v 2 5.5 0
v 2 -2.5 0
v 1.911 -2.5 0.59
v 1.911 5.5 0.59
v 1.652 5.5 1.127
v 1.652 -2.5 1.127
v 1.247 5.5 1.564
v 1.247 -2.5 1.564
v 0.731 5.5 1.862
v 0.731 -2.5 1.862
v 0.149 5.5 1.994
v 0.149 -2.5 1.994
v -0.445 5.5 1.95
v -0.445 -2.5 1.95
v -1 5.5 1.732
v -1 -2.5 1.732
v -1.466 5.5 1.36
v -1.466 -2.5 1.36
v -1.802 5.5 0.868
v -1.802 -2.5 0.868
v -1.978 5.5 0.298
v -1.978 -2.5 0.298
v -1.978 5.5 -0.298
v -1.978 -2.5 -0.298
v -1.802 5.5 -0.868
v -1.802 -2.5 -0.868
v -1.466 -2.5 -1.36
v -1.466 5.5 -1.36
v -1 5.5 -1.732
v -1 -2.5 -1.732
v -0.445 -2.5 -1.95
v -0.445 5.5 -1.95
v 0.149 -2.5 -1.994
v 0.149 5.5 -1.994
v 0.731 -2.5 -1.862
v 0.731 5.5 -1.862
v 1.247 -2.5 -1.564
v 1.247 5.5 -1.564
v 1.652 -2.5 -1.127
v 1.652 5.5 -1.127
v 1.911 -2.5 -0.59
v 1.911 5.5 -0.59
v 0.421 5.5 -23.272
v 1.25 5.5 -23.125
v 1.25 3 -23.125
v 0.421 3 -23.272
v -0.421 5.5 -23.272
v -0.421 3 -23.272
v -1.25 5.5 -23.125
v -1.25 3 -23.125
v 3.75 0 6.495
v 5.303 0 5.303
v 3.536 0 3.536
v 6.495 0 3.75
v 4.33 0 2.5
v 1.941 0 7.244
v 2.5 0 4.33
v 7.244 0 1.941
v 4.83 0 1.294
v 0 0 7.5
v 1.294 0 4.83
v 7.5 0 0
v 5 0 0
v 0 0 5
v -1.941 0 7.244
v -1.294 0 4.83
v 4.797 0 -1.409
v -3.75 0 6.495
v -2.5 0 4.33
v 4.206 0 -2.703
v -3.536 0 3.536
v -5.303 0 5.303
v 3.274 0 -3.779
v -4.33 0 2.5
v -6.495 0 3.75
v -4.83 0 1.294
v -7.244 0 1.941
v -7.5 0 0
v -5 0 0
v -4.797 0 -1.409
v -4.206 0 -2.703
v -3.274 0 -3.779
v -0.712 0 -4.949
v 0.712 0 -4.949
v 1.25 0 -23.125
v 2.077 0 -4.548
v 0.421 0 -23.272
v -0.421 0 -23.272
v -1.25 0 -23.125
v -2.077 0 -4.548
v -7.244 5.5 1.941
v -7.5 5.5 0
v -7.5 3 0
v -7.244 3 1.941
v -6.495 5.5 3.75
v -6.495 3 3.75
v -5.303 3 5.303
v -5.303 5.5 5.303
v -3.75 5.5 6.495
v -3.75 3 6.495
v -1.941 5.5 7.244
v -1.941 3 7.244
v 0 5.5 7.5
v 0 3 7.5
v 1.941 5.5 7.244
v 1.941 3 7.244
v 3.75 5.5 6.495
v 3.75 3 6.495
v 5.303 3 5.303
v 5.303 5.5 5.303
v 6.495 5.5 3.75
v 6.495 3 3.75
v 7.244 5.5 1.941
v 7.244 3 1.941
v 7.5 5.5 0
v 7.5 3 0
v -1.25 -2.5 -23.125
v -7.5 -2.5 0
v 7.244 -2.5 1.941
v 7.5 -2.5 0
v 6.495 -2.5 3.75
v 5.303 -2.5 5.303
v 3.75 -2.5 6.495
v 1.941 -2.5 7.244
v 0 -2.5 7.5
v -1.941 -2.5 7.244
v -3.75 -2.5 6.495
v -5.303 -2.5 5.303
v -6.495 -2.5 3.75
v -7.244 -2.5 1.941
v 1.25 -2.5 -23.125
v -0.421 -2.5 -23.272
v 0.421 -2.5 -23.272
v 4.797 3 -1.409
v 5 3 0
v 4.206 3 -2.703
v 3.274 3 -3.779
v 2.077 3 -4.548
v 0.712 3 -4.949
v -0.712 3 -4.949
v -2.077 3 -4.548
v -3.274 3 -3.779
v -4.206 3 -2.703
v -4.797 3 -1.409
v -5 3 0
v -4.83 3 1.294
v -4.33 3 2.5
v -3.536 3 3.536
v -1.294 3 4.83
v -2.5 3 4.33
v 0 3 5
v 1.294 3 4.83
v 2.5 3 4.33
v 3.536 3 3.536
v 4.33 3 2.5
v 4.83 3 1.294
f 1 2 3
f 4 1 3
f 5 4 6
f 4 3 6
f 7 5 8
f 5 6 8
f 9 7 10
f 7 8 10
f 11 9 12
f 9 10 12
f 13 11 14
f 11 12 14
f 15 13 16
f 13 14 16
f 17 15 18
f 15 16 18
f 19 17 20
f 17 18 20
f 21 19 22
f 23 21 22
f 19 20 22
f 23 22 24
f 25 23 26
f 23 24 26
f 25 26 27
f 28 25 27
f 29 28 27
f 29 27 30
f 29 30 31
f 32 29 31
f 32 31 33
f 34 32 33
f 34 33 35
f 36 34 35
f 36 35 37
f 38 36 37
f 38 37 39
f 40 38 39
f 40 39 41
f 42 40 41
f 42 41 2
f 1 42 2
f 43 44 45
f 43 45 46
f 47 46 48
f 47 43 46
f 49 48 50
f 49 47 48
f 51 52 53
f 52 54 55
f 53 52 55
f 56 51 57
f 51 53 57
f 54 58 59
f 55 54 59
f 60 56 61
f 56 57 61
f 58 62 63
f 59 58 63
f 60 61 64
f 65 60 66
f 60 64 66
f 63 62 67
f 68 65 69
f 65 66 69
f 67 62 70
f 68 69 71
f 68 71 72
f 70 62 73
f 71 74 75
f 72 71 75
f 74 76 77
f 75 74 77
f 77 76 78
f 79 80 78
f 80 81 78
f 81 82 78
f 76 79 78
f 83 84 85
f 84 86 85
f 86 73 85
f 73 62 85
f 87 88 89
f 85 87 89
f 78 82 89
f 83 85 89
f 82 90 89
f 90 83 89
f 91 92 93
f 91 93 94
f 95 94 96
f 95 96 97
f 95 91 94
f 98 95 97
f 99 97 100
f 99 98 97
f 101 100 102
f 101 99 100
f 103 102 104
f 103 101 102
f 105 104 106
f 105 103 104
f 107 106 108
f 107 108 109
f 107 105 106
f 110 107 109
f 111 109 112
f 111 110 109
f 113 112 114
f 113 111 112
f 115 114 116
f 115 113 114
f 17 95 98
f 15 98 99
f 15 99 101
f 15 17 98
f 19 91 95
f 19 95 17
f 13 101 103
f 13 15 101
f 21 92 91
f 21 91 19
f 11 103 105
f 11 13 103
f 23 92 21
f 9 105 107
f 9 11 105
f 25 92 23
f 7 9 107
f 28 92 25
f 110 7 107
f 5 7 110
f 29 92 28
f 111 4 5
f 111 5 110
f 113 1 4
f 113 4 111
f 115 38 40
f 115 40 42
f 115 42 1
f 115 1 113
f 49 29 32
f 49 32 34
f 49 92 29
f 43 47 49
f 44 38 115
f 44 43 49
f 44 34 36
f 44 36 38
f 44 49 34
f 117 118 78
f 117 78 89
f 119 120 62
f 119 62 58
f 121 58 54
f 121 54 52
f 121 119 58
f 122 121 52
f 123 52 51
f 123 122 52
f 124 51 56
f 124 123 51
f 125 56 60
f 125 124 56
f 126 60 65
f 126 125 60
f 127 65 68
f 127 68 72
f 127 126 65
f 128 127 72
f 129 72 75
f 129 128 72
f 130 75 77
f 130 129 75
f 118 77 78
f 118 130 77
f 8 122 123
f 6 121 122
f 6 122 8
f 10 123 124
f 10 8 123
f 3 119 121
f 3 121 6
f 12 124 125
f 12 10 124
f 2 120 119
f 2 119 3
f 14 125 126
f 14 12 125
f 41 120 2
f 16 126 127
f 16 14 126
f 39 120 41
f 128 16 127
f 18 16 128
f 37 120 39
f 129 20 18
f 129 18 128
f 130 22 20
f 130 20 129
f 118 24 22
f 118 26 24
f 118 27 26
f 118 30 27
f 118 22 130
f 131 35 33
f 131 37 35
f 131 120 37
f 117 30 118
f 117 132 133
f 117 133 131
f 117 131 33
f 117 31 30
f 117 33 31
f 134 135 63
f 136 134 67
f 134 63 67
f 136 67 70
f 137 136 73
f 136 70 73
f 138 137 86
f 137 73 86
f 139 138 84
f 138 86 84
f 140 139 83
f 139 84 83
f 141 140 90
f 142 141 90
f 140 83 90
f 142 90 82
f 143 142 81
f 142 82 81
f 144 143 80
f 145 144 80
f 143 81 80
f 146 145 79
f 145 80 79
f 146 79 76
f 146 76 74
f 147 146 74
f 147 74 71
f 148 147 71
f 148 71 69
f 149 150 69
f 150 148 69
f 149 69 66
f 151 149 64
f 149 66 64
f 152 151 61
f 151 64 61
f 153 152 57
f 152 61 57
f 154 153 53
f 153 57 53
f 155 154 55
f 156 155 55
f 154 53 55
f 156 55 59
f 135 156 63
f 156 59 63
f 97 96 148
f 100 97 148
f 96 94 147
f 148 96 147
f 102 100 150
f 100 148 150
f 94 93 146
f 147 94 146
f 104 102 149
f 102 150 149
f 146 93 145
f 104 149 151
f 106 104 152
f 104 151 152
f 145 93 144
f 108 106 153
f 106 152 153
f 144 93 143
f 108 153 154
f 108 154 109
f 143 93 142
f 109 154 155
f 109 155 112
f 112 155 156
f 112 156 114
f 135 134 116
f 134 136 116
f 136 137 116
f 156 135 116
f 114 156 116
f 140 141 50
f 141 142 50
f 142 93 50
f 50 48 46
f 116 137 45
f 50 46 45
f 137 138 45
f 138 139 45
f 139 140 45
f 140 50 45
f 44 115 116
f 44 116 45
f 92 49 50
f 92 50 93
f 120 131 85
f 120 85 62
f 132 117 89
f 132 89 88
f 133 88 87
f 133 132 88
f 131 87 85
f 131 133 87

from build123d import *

# Parameters (mm, degrees)
SKETCH_1_R          = 5
EXTRUDE_1_DEPTH     = 3
EXTRUDE_3_DEPTH     = 2.5
EXTRUDE_4_DEPTH     = 2.5
EXTRUDE_START       = -8
EXTRUDE_5_DEPTH     = 2.5
SKETCH_9_R          = 2
CUT_EXTRUDE_1_DEPTH = 9


with BuildPart() as part:
    # 草图1 → 凸台-拉伸1 (new body)
    with BuildSketch(Plane(origin=(0, 0, 0), x_dir=(1, 0, 0), z_dir=(0, 1, 0))):
        Circle(SKETCH_1_R)
    extrude(amount=EXTRUDE_1_DEPTH)

    # 草图6 → 凸台-拉伸3 (add)
    with BuildSketch(Plane.XZ):
        with BuildLine():
            Line((0, -5), (0, 5))
            ThreePointArc((0, 5), (-3.535533906, 3.535533906), (-5, 0))
            Line((-5, 0), (-4.319264806, -2.518720218))
            ThreePointArc((-4.319264806, -2.518720218), (-2.490622303, -4.335527712), (0, -5))
        make_face()
        with BuildLine():
            Line((0, -18.5), (0, -5))
            ThreePointArc((0, -5), (-2.490622303, -4.335527712), (-4.319264806, -2.518720218))
            Line((-4.319264806, -2.518720218), (0, -18.5))
        make_face()
        with BuildLine():
            ThreePointArc((5, 0), (3.535533906, 3.535533906), (0, 5))
            Line((0, 5), (0, -5))
            ThreePointArc((0, -5), (2.490622303, -4.335527712), (4.319264806, -2.518720218))
            Line((4.319264806, -2.518720218), (5, 0))
        make_face()
        with BuildLine():
            ThreePointArc((4.319264806, -2.518720218), (2.490622303, -4.335527712), (0, -5))
            Line((0, -5), (0, -18.5))
            Line((0, -18.5), (4.319264806, -2.518720218))
        make_face()
    extrude_3 = extrude(amount=EXTRUDE_3_DEPTH)

    # 镜向1: 凸台-拉伸3 across plane
    add(extrude_3.mirror(Plane.ZX.offset(1.5)))

    # 草图8 → 凸台-拉伸4 (add)
    with BuildSketch(Plane(origin=(0, 5.5, 0), x_dir=(1, 0, 0), z_dir=(0, 1, 0))):
        with BuildLine():
            Line((1.25, 23.125), (0, 18.5))
            Line((0, 18.5), (-1.25, 23.125))
            Line((-1.25, 23.125), (-7.5, 0))
            ThreePointArc((-7.5, 0), (0, -7.5), (7.5, 0))
            Line((7.5, 0), (1.25, 23.125))
        make_face()
        with BuildLine():
            Line((-5, 0), (0, 18.5))
            Line((0, 18.5), (5, 0))
            ThreePointArc((5, 0), (0, -5), (-5, 0))
        make_face(mode=Mode.SUBTRACT)
        with BuildLine():
            Line((-1.25, 23.125), (0, 18.5))
            Line((0, 18.5), (1.25, 23.125))
            ThreePointArc((1.25, 23.125), (0, 23.290941974), (-1.25, 23.125))
        make_face()
    extrude(amount=-EXTRUDE_4_DEPTH)

    # 草图8<4> → 凸台-拉伸5 (add)
    with BuildSketch(Plane(origin=(0, 5.5, 0), x_dir=(1, 0, 0), z_dir=(0, 1, 0)).offset(EXTRUDE_START)):
        with BuildLine():
            Line((-7.5, 0), (-1.25, 23.125))
            ThreePointArc((-1.25, 23.125), (0, 23.290941974), (1.25, 23.125))
            Line((1.25, 23.125), (7.5, 0))
            ThreePointArc((7.5, 0), (0, -7.5), (-7.5, 0))
        make_face()
    extrude(amount=EXTRUDE_5_DEPTH)

    # 草图9 → 切除-拉伸1 (cut, through all)
    with BuildSketch(Plane.XZ.offset(2.5)):
        Circle(SKETCH_9_R)
    extrude(amount=-CUT_EXTRUDE_1_DEPTH, mode=Mode.SUBTRACT)


solid = part.part
